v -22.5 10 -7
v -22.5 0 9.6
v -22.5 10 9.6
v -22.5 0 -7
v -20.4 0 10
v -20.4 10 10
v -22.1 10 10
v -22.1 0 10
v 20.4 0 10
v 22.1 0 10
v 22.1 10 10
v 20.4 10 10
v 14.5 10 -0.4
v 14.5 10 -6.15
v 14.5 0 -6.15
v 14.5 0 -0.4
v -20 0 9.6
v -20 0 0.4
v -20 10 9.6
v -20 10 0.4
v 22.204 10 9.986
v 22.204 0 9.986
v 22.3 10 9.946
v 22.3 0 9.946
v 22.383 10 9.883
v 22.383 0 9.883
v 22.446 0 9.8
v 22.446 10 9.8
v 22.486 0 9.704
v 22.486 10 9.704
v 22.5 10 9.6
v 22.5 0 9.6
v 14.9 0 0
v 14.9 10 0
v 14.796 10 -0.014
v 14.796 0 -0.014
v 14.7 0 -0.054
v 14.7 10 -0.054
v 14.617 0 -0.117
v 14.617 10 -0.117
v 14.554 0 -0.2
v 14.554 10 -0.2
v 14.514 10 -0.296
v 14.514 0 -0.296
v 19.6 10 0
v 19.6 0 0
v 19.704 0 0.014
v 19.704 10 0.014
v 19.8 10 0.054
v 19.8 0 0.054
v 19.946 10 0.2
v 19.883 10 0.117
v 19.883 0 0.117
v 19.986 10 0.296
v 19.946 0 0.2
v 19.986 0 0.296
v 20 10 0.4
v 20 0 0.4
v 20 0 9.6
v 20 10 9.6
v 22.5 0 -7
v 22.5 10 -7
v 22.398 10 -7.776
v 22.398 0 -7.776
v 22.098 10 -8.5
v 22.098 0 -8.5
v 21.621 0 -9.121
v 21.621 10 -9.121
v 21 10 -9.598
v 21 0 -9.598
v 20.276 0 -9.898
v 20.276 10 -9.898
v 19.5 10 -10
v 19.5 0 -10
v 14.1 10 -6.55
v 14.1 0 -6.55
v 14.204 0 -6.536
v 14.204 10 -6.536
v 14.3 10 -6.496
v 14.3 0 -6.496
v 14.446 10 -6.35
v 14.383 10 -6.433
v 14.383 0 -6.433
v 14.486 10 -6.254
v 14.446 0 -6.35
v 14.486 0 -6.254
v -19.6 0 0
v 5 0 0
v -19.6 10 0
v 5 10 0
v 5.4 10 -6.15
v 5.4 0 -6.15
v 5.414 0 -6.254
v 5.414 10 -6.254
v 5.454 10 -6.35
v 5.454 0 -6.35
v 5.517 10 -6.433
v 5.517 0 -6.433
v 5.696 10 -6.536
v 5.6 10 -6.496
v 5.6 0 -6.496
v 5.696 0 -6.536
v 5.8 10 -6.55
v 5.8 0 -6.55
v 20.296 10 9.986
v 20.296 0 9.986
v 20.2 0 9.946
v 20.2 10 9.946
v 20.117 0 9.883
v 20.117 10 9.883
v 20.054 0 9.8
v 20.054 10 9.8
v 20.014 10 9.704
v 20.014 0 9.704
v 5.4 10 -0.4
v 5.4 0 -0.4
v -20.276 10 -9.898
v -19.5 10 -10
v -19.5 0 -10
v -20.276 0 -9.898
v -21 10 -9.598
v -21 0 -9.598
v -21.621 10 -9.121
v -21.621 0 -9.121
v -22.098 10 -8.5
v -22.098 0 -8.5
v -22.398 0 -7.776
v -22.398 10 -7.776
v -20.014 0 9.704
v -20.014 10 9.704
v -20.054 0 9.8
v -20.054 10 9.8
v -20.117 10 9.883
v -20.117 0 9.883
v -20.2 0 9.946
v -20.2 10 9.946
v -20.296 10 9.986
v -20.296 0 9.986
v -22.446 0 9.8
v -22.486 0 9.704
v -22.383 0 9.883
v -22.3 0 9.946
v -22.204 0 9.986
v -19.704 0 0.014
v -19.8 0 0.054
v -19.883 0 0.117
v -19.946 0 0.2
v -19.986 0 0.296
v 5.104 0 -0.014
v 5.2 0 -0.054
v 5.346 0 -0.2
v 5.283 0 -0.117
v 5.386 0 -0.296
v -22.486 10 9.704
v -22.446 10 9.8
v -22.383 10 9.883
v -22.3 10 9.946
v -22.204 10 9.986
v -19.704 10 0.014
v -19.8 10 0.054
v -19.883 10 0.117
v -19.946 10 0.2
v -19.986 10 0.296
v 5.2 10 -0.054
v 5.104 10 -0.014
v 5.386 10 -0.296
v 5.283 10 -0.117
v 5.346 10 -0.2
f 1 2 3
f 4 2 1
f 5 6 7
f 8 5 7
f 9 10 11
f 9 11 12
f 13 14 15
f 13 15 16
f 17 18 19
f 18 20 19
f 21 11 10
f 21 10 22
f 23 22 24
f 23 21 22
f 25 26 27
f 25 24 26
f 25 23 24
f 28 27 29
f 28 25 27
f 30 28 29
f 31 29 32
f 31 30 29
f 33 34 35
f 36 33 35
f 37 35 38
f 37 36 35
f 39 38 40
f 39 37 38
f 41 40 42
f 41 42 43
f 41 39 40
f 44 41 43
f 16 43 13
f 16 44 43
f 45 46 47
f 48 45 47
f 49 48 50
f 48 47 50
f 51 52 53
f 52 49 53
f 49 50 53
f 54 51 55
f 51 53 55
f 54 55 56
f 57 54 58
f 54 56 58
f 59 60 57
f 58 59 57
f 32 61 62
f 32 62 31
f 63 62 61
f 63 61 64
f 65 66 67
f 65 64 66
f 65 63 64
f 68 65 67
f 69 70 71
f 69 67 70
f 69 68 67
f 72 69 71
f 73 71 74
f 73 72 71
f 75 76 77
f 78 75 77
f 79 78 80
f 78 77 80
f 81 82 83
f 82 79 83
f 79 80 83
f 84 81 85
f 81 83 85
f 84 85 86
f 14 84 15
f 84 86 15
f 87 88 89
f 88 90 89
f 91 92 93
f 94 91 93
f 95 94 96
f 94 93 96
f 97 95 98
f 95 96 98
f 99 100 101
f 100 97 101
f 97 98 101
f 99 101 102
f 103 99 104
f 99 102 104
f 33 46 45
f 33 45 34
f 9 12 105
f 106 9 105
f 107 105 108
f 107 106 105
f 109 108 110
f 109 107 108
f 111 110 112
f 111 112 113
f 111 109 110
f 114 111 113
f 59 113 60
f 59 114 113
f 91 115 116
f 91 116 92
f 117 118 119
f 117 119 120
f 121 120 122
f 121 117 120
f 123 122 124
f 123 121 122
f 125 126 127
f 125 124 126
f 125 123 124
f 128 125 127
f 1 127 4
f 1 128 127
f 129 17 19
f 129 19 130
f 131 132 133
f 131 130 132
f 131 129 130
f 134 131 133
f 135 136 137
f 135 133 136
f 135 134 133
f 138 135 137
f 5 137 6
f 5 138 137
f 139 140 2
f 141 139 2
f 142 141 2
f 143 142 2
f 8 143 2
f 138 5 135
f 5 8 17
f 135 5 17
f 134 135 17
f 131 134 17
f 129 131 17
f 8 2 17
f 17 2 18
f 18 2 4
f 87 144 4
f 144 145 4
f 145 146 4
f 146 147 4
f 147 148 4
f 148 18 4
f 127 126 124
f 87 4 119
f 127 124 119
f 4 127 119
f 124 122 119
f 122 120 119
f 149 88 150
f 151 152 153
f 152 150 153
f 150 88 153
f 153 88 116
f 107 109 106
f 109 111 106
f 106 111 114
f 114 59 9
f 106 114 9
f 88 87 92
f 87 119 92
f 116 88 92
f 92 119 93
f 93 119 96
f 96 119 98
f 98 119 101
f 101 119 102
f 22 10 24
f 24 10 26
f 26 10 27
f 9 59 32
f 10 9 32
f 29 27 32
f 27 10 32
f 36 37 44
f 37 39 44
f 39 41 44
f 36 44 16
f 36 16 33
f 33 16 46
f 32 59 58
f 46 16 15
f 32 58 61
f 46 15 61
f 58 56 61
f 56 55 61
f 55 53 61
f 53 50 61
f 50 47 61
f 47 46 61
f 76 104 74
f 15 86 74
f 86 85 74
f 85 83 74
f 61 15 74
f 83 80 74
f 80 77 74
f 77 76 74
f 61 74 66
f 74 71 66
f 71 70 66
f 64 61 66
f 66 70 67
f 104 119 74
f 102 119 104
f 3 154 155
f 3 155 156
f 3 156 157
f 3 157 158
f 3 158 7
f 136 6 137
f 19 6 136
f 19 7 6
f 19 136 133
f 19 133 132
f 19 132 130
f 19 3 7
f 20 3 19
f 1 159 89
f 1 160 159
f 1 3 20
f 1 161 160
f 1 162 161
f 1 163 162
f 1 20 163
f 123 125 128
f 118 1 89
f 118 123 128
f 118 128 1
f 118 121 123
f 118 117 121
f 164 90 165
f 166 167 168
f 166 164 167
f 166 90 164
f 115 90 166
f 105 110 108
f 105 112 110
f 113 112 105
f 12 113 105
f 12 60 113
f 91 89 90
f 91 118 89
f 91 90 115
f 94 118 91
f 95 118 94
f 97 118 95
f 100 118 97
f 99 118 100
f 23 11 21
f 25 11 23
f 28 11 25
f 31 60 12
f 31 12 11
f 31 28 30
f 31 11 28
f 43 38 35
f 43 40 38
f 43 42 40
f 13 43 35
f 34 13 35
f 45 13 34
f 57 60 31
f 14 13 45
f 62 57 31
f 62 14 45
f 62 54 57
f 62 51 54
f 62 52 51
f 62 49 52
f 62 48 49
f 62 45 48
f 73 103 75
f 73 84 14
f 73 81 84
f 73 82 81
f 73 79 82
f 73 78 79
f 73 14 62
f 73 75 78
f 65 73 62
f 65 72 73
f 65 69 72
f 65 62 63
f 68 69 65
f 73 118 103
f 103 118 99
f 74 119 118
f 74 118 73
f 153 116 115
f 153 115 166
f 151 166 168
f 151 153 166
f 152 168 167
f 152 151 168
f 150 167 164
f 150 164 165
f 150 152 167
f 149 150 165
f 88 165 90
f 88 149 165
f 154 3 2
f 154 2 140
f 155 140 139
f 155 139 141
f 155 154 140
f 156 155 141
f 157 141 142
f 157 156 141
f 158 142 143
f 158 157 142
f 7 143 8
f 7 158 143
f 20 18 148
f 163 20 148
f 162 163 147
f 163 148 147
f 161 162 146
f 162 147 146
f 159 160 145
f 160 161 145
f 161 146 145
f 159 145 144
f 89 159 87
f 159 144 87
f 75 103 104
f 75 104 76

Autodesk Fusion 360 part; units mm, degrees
sketch "Sketch1" plane through (0, 0, 0) normal (0, 1, 0) x (1, 0, 0)
  line L0 (-22.5, 10) -> (22.5, 10)
  line L1 (22.5, 10) -> (22.5, -10)
  line L2 (22.5, -10) -> (-22.5, -10)
  line L3 (-22.5, -10) -> (-22.5, 10)
  line L4 (-22.5, 10) -> (22.5, -10) construction
  line L5 (22.5, 10) -> (-22.5, -10) construction
  dimension "d1" = 45
  dimension "d2" = 20
extrude "Extrude1" add sketch "Sketch1" along normal blind 10
sketch "Sketch2" plane through (0, 10, 0) normal (0, 1, 0) x (-1, 0, 0)
  line L0 (22.5, 10) -> (-22.5, 10)
  line L1 (-22.5, 10) -> (-22.5, -10)
  line L2 (-22.5, -10) -> (22.5, -10)
  line L3 (22.5, -10) -> (22.5, 10)
  line L4 (20, 10) -> (-20, 10)
  line L5 (-20, 10) -> (-20, 0)
  line L6 (-20, 0) -> (20, 0)
  line L7 (20, 0) -> (20, 10)
  dimension "d5" = 40
  dimension "d6" = 10
  dimension "d7" = 2.5
extrude "Extrude2" cut sketch "Sketch2" against normal through all contours L0 L4 L5 L6 L7
sketch "Sketch3" plane through (0, 10, 0) normal (0, 1, 0) x (-1, 0, 0)
  line L0 (20, 10) -> (20, 0)
  line L1 (20, 0) -> (-20, 0)
  line L2 (-20, 0) -> (-20, 10)
  line L3 (-20, 10) -> (-22.5, 10)
  line L4 (-22.5, 10) -> (-22.5, -10)
  line L5 (-22.5, -10) -> (22.5, -10)
  line L6 (22.5, -10) -> (22.5, 10)
  line L7 (22.5, 10) -> (20, 10)
  line L8 (-14.5, 0) -> (-5.4, 0)
  line L9 (-5.4, 0) -> (-5.4, -6.55)
  line L10 (-5.4, -6.55) -> (-14.5, -6.55)
  line L11 (-14.5, -6.55) -> (-14.5, 0)
  dimension "d9" = 9.1
  dimension "d12" = 6.55
  dimension "d13" = 5.5
extrude "Extrude3" cut sketch "Sketch3" against normal through all contours L1 L8 L9 L10 L11
fillet "Fillet1" radius 0.4 10 edges at (-20, 5, 10) (-20, 5, 0) (5.4, 5, 0) (5.4, 5, -6.55) (14.5, 5, -6.55) (14.5, 5, 0) (20, 5, 0) (20, 5, 10) (-22.5, 5, 10) (22.5, 5, 10)
fillet "Fillet2" radius 3 2 edges at (-22.5, 5, -10) (22.5, 5, -10)
